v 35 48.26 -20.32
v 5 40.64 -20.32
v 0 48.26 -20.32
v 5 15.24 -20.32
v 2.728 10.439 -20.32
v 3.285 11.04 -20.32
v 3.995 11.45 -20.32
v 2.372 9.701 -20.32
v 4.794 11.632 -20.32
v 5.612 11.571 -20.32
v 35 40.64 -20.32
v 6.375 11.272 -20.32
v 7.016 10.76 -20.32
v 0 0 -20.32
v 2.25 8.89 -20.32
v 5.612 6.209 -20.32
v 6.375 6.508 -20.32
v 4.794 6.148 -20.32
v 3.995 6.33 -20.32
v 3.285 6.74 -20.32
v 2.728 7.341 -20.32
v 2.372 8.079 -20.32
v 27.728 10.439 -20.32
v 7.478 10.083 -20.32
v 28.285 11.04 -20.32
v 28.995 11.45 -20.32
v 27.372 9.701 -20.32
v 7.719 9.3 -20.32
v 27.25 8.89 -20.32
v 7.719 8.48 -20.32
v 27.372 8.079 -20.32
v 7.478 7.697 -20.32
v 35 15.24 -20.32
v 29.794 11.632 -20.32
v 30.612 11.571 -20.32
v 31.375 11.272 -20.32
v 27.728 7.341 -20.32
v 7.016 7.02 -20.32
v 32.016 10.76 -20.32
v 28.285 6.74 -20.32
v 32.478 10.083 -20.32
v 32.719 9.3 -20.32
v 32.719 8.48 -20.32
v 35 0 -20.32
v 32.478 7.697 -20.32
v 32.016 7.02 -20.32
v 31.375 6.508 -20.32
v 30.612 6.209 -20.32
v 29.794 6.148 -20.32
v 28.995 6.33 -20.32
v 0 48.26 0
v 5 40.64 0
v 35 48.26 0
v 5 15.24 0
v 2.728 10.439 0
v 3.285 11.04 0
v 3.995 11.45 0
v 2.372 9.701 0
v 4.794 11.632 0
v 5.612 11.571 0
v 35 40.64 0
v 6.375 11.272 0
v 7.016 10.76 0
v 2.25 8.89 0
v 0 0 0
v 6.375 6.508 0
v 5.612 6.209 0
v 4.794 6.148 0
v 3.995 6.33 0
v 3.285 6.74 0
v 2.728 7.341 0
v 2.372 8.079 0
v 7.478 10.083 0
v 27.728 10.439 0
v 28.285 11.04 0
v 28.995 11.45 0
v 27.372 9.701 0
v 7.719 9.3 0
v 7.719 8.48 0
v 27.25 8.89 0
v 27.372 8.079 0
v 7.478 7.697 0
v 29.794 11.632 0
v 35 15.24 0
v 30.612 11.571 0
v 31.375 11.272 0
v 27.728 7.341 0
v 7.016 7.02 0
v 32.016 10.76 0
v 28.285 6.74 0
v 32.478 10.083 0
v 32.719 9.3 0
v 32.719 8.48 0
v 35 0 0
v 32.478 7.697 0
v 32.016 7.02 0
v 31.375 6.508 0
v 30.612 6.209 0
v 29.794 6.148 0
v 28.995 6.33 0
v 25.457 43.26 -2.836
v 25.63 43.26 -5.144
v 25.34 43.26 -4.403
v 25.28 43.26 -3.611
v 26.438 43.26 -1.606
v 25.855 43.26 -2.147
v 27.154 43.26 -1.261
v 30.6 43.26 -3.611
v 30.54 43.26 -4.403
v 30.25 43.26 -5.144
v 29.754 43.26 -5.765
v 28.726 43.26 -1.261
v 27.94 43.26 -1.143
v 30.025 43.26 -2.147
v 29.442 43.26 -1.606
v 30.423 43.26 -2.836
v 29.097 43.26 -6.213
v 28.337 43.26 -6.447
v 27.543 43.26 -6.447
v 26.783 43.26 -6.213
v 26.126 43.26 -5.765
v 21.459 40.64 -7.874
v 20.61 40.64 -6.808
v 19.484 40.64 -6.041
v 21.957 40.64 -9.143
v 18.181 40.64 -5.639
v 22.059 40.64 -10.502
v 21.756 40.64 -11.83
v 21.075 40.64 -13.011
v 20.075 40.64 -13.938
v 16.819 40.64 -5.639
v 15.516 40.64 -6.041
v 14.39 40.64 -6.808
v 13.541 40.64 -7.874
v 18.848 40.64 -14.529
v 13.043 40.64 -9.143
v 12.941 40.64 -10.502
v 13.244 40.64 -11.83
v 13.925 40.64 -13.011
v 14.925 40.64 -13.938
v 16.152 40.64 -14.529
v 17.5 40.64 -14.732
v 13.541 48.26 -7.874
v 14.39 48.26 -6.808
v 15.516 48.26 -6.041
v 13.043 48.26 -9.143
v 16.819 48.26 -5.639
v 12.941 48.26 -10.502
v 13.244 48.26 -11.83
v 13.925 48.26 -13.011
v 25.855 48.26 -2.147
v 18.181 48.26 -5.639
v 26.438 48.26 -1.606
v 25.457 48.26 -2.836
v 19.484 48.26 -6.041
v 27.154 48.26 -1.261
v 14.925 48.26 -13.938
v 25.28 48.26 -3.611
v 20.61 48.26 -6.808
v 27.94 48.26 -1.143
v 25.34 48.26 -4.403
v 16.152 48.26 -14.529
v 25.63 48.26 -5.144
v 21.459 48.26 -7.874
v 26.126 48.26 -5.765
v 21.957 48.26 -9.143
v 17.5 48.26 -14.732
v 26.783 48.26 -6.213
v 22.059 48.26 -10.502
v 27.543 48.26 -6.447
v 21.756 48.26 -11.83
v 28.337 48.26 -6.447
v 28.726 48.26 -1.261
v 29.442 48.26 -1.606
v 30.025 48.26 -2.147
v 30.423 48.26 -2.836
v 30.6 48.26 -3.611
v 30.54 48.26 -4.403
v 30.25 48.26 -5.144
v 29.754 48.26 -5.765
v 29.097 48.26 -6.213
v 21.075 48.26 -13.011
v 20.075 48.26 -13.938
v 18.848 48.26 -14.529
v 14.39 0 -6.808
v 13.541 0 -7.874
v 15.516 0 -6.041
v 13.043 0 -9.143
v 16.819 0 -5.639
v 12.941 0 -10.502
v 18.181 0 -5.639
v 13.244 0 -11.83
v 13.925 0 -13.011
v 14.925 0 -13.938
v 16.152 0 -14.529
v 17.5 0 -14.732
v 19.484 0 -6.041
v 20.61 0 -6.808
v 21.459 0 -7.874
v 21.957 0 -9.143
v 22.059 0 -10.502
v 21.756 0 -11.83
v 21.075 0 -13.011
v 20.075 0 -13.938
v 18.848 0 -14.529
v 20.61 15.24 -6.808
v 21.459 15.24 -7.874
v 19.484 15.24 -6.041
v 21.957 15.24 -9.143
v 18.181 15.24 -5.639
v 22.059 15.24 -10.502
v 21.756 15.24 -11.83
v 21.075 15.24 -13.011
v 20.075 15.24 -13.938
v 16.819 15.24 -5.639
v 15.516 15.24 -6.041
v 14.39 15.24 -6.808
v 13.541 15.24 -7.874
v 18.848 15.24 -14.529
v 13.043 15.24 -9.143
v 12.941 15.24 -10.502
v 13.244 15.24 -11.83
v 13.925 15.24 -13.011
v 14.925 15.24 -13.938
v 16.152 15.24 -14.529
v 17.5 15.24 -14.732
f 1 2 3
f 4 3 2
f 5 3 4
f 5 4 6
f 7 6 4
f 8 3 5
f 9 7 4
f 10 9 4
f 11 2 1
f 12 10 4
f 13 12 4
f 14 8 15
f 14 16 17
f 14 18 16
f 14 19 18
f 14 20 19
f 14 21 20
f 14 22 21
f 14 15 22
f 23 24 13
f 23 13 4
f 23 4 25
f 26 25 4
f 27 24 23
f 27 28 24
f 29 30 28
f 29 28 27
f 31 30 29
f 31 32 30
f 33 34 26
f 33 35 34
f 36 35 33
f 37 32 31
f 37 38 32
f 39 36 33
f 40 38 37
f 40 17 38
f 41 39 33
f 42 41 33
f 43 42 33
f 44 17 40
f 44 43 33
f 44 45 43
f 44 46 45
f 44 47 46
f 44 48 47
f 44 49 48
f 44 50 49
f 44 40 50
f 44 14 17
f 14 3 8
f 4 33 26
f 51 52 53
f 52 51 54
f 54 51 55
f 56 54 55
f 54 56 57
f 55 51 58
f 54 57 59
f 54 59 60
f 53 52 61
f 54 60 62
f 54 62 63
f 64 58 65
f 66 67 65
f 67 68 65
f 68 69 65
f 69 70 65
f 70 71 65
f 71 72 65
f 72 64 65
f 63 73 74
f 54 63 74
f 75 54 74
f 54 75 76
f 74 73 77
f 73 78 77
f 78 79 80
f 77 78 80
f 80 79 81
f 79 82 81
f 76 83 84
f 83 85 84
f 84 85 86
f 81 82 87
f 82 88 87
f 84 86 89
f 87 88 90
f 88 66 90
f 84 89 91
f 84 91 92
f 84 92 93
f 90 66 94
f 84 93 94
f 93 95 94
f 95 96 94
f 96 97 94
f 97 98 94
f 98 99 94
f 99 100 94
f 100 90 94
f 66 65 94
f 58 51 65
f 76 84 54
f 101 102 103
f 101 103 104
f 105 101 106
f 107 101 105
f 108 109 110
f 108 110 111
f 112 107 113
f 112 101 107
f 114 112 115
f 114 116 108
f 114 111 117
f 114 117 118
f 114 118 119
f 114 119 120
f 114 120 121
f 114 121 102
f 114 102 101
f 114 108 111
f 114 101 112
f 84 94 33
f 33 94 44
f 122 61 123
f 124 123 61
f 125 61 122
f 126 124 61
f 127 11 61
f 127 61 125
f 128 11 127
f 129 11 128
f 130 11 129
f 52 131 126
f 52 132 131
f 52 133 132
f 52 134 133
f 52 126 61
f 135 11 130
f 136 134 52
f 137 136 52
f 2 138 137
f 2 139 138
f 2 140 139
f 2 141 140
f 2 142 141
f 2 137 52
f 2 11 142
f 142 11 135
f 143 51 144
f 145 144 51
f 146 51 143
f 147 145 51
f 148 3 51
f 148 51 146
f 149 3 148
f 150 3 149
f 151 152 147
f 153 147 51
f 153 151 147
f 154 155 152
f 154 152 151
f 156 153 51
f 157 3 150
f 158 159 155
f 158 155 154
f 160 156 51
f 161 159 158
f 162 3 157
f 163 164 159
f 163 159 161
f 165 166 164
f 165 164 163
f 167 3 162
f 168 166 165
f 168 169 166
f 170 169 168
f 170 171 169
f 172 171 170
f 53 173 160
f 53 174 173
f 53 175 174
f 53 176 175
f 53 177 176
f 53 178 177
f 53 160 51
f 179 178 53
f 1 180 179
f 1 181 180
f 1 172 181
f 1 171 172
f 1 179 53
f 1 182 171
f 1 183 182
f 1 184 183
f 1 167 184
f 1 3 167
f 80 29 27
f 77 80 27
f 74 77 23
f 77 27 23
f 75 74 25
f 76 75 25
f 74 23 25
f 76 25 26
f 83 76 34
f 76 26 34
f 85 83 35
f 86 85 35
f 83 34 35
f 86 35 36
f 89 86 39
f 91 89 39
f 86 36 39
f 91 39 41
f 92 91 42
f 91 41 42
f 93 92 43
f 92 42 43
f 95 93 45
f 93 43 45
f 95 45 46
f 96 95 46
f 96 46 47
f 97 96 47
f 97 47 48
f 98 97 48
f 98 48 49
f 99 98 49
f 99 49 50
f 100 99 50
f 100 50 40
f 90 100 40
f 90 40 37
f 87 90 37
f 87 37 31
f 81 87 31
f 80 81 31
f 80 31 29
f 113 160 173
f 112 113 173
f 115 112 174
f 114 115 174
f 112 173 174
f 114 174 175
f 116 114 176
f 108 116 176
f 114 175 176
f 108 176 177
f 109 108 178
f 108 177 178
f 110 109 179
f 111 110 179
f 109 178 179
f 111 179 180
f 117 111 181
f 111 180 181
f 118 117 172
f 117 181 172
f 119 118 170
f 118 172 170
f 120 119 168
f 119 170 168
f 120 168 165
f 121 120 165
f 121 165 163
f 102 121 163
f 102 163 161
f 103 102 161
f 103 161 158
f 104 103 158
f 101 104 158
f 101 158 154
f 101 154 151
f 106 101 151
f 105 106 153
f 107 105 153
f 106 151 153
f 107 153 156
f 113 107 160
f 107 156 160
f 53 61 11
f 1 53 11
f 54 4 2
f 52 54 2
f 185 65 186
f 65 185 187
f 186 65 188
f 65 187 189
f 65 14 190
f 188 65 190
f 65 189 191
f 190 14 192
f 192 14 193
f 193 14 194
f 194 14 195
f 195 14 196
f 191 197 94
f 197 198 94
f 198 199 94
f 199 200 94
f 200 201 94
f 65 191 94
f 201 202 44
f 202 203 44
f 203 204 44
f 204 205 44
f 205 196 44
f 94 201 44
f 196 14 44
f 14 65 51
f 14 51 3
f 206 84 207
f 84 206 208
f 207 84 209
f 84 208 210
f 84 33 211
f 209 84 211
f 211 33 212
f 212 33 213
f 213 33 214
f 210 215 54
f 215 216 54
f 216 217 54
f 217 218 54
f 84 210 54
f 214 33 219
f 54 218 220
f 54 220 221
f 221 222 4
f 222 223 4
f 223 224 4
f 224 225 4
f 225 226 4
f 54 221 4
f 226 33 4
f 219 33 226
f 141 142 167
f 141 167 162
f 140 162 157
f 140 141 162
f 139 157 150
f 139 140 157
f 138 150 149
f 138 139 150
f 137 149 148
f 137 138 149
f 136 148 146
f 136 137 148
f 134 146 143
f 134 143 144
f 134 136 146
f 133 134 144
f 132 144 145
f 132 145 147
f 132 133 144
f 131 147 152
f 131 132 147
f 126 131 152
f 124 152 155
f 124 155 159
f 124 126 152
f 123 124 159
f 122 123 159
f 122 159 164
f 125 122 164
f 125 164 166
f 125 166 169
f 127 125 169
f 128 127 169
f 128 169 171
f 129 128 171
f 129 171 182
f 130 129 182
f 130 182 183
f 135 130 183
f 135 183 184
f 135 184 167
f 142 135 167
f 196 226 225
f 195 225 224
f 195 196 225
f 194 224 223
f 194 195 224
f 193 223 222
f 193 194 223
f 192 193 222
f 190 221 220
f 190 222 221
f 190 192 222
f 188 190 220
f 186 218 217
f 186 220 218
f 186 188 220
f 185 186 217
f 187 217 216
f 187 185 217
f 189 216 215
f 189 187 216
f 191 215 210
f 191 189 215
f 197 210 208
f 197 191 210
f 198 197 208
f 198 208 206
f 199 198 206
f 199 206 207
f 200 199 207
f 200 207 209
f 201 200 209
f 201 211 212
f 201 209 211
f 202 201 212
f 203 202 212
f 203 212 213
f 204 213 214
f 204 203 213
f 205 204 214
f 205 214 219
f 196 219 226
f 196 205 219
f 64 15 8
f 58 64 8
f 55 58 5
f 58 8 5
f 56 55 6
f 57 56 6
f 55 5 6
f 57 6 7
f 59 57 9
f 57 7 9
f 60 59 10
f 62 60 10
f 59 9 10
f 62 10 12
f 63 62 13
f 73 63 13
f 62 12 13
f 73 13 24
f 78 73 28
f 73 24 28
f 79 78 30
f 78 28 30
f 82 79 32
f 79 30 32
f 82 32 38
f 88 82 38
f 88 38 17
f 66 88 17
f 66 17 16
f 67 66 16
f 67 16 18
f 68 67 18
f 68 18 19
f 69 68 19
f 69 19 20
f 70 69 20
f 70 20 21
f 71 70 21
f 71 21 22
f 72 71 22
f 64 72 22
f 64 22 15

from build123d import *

# Parameters (mm, degrees)
SKETCH2_W            = 35
SKETCH2_H            = 20.32
SKETCH2_R            = 4.572
BOSS_EXTRUDE1_DEPTH  = 48.26
M5_CLEARANCE_HOLE1_D = 5.5
SKETCH7_R            = 2.667
CUT_EXTRUDE1_DEPTH   = 5
SKETCH8_W            = 30
SKETCH8_H            = 25.4
CUT_EXTRUDE2_DEPTH   = 63.983569286


with BuildPart() as part:
    # Sketch2 → Boss-Extrude1 (new body)
    with BuildSketch(Plane(origin=(0, 0, 0), x_dir=(1, 0, 0), z_dir=(0, 1, 0))):
        with Locations((17.5, 10.16)):
            Rectangle(SKETCH2_W, SKETCH2_H)
        with Locations(Location((17.5, 10.16, 0), (0, 0, 90))):
            Circle(SKETCH2_R, mode=Mode.SUBTRACT)
    extrude(amount=BOSS_EXTRUDE1_DEPTH)

    # M5 Clearance Hole1 (through all)
    with Locations(Plane.XY):
        with Locations((5, 8.89), (30, 8.89)):
            Hole(M5_CLEARANCE_HOLE1_D / 2)

    # Sketch7 → Cut-Extrude1 (cut)
    with BuildSketch(Plane(origin=(0, 48.26, 0), x_dir=(1, 0, 0), z_dir=(0, 1, 0))):
        with Locations(Location((27.94, 3.81, 0), (0, 0, 270))):
            Circle(SKETCH7_R)
    extrude(amount=-CUT_EXTRUDE1_DEPTH, mode=Mode.SUBTRACT)

    # Sketch8 → Cut-Extrude2 (cut, through all)
    with BuildSketch(Plane(origin=(0, 0, -20.32), x_dir=(-1, 0, 0), z_dir=(0, 0, -1))):
        with Locations((-20, 27.94)):
            Rectangle(SKETCH8_W, SKETCH8_H)
    extrude(amount=-CUT_EXTRUDE2_DEPTH, mode=Mode.SUBTRACT)


solid = part.part
